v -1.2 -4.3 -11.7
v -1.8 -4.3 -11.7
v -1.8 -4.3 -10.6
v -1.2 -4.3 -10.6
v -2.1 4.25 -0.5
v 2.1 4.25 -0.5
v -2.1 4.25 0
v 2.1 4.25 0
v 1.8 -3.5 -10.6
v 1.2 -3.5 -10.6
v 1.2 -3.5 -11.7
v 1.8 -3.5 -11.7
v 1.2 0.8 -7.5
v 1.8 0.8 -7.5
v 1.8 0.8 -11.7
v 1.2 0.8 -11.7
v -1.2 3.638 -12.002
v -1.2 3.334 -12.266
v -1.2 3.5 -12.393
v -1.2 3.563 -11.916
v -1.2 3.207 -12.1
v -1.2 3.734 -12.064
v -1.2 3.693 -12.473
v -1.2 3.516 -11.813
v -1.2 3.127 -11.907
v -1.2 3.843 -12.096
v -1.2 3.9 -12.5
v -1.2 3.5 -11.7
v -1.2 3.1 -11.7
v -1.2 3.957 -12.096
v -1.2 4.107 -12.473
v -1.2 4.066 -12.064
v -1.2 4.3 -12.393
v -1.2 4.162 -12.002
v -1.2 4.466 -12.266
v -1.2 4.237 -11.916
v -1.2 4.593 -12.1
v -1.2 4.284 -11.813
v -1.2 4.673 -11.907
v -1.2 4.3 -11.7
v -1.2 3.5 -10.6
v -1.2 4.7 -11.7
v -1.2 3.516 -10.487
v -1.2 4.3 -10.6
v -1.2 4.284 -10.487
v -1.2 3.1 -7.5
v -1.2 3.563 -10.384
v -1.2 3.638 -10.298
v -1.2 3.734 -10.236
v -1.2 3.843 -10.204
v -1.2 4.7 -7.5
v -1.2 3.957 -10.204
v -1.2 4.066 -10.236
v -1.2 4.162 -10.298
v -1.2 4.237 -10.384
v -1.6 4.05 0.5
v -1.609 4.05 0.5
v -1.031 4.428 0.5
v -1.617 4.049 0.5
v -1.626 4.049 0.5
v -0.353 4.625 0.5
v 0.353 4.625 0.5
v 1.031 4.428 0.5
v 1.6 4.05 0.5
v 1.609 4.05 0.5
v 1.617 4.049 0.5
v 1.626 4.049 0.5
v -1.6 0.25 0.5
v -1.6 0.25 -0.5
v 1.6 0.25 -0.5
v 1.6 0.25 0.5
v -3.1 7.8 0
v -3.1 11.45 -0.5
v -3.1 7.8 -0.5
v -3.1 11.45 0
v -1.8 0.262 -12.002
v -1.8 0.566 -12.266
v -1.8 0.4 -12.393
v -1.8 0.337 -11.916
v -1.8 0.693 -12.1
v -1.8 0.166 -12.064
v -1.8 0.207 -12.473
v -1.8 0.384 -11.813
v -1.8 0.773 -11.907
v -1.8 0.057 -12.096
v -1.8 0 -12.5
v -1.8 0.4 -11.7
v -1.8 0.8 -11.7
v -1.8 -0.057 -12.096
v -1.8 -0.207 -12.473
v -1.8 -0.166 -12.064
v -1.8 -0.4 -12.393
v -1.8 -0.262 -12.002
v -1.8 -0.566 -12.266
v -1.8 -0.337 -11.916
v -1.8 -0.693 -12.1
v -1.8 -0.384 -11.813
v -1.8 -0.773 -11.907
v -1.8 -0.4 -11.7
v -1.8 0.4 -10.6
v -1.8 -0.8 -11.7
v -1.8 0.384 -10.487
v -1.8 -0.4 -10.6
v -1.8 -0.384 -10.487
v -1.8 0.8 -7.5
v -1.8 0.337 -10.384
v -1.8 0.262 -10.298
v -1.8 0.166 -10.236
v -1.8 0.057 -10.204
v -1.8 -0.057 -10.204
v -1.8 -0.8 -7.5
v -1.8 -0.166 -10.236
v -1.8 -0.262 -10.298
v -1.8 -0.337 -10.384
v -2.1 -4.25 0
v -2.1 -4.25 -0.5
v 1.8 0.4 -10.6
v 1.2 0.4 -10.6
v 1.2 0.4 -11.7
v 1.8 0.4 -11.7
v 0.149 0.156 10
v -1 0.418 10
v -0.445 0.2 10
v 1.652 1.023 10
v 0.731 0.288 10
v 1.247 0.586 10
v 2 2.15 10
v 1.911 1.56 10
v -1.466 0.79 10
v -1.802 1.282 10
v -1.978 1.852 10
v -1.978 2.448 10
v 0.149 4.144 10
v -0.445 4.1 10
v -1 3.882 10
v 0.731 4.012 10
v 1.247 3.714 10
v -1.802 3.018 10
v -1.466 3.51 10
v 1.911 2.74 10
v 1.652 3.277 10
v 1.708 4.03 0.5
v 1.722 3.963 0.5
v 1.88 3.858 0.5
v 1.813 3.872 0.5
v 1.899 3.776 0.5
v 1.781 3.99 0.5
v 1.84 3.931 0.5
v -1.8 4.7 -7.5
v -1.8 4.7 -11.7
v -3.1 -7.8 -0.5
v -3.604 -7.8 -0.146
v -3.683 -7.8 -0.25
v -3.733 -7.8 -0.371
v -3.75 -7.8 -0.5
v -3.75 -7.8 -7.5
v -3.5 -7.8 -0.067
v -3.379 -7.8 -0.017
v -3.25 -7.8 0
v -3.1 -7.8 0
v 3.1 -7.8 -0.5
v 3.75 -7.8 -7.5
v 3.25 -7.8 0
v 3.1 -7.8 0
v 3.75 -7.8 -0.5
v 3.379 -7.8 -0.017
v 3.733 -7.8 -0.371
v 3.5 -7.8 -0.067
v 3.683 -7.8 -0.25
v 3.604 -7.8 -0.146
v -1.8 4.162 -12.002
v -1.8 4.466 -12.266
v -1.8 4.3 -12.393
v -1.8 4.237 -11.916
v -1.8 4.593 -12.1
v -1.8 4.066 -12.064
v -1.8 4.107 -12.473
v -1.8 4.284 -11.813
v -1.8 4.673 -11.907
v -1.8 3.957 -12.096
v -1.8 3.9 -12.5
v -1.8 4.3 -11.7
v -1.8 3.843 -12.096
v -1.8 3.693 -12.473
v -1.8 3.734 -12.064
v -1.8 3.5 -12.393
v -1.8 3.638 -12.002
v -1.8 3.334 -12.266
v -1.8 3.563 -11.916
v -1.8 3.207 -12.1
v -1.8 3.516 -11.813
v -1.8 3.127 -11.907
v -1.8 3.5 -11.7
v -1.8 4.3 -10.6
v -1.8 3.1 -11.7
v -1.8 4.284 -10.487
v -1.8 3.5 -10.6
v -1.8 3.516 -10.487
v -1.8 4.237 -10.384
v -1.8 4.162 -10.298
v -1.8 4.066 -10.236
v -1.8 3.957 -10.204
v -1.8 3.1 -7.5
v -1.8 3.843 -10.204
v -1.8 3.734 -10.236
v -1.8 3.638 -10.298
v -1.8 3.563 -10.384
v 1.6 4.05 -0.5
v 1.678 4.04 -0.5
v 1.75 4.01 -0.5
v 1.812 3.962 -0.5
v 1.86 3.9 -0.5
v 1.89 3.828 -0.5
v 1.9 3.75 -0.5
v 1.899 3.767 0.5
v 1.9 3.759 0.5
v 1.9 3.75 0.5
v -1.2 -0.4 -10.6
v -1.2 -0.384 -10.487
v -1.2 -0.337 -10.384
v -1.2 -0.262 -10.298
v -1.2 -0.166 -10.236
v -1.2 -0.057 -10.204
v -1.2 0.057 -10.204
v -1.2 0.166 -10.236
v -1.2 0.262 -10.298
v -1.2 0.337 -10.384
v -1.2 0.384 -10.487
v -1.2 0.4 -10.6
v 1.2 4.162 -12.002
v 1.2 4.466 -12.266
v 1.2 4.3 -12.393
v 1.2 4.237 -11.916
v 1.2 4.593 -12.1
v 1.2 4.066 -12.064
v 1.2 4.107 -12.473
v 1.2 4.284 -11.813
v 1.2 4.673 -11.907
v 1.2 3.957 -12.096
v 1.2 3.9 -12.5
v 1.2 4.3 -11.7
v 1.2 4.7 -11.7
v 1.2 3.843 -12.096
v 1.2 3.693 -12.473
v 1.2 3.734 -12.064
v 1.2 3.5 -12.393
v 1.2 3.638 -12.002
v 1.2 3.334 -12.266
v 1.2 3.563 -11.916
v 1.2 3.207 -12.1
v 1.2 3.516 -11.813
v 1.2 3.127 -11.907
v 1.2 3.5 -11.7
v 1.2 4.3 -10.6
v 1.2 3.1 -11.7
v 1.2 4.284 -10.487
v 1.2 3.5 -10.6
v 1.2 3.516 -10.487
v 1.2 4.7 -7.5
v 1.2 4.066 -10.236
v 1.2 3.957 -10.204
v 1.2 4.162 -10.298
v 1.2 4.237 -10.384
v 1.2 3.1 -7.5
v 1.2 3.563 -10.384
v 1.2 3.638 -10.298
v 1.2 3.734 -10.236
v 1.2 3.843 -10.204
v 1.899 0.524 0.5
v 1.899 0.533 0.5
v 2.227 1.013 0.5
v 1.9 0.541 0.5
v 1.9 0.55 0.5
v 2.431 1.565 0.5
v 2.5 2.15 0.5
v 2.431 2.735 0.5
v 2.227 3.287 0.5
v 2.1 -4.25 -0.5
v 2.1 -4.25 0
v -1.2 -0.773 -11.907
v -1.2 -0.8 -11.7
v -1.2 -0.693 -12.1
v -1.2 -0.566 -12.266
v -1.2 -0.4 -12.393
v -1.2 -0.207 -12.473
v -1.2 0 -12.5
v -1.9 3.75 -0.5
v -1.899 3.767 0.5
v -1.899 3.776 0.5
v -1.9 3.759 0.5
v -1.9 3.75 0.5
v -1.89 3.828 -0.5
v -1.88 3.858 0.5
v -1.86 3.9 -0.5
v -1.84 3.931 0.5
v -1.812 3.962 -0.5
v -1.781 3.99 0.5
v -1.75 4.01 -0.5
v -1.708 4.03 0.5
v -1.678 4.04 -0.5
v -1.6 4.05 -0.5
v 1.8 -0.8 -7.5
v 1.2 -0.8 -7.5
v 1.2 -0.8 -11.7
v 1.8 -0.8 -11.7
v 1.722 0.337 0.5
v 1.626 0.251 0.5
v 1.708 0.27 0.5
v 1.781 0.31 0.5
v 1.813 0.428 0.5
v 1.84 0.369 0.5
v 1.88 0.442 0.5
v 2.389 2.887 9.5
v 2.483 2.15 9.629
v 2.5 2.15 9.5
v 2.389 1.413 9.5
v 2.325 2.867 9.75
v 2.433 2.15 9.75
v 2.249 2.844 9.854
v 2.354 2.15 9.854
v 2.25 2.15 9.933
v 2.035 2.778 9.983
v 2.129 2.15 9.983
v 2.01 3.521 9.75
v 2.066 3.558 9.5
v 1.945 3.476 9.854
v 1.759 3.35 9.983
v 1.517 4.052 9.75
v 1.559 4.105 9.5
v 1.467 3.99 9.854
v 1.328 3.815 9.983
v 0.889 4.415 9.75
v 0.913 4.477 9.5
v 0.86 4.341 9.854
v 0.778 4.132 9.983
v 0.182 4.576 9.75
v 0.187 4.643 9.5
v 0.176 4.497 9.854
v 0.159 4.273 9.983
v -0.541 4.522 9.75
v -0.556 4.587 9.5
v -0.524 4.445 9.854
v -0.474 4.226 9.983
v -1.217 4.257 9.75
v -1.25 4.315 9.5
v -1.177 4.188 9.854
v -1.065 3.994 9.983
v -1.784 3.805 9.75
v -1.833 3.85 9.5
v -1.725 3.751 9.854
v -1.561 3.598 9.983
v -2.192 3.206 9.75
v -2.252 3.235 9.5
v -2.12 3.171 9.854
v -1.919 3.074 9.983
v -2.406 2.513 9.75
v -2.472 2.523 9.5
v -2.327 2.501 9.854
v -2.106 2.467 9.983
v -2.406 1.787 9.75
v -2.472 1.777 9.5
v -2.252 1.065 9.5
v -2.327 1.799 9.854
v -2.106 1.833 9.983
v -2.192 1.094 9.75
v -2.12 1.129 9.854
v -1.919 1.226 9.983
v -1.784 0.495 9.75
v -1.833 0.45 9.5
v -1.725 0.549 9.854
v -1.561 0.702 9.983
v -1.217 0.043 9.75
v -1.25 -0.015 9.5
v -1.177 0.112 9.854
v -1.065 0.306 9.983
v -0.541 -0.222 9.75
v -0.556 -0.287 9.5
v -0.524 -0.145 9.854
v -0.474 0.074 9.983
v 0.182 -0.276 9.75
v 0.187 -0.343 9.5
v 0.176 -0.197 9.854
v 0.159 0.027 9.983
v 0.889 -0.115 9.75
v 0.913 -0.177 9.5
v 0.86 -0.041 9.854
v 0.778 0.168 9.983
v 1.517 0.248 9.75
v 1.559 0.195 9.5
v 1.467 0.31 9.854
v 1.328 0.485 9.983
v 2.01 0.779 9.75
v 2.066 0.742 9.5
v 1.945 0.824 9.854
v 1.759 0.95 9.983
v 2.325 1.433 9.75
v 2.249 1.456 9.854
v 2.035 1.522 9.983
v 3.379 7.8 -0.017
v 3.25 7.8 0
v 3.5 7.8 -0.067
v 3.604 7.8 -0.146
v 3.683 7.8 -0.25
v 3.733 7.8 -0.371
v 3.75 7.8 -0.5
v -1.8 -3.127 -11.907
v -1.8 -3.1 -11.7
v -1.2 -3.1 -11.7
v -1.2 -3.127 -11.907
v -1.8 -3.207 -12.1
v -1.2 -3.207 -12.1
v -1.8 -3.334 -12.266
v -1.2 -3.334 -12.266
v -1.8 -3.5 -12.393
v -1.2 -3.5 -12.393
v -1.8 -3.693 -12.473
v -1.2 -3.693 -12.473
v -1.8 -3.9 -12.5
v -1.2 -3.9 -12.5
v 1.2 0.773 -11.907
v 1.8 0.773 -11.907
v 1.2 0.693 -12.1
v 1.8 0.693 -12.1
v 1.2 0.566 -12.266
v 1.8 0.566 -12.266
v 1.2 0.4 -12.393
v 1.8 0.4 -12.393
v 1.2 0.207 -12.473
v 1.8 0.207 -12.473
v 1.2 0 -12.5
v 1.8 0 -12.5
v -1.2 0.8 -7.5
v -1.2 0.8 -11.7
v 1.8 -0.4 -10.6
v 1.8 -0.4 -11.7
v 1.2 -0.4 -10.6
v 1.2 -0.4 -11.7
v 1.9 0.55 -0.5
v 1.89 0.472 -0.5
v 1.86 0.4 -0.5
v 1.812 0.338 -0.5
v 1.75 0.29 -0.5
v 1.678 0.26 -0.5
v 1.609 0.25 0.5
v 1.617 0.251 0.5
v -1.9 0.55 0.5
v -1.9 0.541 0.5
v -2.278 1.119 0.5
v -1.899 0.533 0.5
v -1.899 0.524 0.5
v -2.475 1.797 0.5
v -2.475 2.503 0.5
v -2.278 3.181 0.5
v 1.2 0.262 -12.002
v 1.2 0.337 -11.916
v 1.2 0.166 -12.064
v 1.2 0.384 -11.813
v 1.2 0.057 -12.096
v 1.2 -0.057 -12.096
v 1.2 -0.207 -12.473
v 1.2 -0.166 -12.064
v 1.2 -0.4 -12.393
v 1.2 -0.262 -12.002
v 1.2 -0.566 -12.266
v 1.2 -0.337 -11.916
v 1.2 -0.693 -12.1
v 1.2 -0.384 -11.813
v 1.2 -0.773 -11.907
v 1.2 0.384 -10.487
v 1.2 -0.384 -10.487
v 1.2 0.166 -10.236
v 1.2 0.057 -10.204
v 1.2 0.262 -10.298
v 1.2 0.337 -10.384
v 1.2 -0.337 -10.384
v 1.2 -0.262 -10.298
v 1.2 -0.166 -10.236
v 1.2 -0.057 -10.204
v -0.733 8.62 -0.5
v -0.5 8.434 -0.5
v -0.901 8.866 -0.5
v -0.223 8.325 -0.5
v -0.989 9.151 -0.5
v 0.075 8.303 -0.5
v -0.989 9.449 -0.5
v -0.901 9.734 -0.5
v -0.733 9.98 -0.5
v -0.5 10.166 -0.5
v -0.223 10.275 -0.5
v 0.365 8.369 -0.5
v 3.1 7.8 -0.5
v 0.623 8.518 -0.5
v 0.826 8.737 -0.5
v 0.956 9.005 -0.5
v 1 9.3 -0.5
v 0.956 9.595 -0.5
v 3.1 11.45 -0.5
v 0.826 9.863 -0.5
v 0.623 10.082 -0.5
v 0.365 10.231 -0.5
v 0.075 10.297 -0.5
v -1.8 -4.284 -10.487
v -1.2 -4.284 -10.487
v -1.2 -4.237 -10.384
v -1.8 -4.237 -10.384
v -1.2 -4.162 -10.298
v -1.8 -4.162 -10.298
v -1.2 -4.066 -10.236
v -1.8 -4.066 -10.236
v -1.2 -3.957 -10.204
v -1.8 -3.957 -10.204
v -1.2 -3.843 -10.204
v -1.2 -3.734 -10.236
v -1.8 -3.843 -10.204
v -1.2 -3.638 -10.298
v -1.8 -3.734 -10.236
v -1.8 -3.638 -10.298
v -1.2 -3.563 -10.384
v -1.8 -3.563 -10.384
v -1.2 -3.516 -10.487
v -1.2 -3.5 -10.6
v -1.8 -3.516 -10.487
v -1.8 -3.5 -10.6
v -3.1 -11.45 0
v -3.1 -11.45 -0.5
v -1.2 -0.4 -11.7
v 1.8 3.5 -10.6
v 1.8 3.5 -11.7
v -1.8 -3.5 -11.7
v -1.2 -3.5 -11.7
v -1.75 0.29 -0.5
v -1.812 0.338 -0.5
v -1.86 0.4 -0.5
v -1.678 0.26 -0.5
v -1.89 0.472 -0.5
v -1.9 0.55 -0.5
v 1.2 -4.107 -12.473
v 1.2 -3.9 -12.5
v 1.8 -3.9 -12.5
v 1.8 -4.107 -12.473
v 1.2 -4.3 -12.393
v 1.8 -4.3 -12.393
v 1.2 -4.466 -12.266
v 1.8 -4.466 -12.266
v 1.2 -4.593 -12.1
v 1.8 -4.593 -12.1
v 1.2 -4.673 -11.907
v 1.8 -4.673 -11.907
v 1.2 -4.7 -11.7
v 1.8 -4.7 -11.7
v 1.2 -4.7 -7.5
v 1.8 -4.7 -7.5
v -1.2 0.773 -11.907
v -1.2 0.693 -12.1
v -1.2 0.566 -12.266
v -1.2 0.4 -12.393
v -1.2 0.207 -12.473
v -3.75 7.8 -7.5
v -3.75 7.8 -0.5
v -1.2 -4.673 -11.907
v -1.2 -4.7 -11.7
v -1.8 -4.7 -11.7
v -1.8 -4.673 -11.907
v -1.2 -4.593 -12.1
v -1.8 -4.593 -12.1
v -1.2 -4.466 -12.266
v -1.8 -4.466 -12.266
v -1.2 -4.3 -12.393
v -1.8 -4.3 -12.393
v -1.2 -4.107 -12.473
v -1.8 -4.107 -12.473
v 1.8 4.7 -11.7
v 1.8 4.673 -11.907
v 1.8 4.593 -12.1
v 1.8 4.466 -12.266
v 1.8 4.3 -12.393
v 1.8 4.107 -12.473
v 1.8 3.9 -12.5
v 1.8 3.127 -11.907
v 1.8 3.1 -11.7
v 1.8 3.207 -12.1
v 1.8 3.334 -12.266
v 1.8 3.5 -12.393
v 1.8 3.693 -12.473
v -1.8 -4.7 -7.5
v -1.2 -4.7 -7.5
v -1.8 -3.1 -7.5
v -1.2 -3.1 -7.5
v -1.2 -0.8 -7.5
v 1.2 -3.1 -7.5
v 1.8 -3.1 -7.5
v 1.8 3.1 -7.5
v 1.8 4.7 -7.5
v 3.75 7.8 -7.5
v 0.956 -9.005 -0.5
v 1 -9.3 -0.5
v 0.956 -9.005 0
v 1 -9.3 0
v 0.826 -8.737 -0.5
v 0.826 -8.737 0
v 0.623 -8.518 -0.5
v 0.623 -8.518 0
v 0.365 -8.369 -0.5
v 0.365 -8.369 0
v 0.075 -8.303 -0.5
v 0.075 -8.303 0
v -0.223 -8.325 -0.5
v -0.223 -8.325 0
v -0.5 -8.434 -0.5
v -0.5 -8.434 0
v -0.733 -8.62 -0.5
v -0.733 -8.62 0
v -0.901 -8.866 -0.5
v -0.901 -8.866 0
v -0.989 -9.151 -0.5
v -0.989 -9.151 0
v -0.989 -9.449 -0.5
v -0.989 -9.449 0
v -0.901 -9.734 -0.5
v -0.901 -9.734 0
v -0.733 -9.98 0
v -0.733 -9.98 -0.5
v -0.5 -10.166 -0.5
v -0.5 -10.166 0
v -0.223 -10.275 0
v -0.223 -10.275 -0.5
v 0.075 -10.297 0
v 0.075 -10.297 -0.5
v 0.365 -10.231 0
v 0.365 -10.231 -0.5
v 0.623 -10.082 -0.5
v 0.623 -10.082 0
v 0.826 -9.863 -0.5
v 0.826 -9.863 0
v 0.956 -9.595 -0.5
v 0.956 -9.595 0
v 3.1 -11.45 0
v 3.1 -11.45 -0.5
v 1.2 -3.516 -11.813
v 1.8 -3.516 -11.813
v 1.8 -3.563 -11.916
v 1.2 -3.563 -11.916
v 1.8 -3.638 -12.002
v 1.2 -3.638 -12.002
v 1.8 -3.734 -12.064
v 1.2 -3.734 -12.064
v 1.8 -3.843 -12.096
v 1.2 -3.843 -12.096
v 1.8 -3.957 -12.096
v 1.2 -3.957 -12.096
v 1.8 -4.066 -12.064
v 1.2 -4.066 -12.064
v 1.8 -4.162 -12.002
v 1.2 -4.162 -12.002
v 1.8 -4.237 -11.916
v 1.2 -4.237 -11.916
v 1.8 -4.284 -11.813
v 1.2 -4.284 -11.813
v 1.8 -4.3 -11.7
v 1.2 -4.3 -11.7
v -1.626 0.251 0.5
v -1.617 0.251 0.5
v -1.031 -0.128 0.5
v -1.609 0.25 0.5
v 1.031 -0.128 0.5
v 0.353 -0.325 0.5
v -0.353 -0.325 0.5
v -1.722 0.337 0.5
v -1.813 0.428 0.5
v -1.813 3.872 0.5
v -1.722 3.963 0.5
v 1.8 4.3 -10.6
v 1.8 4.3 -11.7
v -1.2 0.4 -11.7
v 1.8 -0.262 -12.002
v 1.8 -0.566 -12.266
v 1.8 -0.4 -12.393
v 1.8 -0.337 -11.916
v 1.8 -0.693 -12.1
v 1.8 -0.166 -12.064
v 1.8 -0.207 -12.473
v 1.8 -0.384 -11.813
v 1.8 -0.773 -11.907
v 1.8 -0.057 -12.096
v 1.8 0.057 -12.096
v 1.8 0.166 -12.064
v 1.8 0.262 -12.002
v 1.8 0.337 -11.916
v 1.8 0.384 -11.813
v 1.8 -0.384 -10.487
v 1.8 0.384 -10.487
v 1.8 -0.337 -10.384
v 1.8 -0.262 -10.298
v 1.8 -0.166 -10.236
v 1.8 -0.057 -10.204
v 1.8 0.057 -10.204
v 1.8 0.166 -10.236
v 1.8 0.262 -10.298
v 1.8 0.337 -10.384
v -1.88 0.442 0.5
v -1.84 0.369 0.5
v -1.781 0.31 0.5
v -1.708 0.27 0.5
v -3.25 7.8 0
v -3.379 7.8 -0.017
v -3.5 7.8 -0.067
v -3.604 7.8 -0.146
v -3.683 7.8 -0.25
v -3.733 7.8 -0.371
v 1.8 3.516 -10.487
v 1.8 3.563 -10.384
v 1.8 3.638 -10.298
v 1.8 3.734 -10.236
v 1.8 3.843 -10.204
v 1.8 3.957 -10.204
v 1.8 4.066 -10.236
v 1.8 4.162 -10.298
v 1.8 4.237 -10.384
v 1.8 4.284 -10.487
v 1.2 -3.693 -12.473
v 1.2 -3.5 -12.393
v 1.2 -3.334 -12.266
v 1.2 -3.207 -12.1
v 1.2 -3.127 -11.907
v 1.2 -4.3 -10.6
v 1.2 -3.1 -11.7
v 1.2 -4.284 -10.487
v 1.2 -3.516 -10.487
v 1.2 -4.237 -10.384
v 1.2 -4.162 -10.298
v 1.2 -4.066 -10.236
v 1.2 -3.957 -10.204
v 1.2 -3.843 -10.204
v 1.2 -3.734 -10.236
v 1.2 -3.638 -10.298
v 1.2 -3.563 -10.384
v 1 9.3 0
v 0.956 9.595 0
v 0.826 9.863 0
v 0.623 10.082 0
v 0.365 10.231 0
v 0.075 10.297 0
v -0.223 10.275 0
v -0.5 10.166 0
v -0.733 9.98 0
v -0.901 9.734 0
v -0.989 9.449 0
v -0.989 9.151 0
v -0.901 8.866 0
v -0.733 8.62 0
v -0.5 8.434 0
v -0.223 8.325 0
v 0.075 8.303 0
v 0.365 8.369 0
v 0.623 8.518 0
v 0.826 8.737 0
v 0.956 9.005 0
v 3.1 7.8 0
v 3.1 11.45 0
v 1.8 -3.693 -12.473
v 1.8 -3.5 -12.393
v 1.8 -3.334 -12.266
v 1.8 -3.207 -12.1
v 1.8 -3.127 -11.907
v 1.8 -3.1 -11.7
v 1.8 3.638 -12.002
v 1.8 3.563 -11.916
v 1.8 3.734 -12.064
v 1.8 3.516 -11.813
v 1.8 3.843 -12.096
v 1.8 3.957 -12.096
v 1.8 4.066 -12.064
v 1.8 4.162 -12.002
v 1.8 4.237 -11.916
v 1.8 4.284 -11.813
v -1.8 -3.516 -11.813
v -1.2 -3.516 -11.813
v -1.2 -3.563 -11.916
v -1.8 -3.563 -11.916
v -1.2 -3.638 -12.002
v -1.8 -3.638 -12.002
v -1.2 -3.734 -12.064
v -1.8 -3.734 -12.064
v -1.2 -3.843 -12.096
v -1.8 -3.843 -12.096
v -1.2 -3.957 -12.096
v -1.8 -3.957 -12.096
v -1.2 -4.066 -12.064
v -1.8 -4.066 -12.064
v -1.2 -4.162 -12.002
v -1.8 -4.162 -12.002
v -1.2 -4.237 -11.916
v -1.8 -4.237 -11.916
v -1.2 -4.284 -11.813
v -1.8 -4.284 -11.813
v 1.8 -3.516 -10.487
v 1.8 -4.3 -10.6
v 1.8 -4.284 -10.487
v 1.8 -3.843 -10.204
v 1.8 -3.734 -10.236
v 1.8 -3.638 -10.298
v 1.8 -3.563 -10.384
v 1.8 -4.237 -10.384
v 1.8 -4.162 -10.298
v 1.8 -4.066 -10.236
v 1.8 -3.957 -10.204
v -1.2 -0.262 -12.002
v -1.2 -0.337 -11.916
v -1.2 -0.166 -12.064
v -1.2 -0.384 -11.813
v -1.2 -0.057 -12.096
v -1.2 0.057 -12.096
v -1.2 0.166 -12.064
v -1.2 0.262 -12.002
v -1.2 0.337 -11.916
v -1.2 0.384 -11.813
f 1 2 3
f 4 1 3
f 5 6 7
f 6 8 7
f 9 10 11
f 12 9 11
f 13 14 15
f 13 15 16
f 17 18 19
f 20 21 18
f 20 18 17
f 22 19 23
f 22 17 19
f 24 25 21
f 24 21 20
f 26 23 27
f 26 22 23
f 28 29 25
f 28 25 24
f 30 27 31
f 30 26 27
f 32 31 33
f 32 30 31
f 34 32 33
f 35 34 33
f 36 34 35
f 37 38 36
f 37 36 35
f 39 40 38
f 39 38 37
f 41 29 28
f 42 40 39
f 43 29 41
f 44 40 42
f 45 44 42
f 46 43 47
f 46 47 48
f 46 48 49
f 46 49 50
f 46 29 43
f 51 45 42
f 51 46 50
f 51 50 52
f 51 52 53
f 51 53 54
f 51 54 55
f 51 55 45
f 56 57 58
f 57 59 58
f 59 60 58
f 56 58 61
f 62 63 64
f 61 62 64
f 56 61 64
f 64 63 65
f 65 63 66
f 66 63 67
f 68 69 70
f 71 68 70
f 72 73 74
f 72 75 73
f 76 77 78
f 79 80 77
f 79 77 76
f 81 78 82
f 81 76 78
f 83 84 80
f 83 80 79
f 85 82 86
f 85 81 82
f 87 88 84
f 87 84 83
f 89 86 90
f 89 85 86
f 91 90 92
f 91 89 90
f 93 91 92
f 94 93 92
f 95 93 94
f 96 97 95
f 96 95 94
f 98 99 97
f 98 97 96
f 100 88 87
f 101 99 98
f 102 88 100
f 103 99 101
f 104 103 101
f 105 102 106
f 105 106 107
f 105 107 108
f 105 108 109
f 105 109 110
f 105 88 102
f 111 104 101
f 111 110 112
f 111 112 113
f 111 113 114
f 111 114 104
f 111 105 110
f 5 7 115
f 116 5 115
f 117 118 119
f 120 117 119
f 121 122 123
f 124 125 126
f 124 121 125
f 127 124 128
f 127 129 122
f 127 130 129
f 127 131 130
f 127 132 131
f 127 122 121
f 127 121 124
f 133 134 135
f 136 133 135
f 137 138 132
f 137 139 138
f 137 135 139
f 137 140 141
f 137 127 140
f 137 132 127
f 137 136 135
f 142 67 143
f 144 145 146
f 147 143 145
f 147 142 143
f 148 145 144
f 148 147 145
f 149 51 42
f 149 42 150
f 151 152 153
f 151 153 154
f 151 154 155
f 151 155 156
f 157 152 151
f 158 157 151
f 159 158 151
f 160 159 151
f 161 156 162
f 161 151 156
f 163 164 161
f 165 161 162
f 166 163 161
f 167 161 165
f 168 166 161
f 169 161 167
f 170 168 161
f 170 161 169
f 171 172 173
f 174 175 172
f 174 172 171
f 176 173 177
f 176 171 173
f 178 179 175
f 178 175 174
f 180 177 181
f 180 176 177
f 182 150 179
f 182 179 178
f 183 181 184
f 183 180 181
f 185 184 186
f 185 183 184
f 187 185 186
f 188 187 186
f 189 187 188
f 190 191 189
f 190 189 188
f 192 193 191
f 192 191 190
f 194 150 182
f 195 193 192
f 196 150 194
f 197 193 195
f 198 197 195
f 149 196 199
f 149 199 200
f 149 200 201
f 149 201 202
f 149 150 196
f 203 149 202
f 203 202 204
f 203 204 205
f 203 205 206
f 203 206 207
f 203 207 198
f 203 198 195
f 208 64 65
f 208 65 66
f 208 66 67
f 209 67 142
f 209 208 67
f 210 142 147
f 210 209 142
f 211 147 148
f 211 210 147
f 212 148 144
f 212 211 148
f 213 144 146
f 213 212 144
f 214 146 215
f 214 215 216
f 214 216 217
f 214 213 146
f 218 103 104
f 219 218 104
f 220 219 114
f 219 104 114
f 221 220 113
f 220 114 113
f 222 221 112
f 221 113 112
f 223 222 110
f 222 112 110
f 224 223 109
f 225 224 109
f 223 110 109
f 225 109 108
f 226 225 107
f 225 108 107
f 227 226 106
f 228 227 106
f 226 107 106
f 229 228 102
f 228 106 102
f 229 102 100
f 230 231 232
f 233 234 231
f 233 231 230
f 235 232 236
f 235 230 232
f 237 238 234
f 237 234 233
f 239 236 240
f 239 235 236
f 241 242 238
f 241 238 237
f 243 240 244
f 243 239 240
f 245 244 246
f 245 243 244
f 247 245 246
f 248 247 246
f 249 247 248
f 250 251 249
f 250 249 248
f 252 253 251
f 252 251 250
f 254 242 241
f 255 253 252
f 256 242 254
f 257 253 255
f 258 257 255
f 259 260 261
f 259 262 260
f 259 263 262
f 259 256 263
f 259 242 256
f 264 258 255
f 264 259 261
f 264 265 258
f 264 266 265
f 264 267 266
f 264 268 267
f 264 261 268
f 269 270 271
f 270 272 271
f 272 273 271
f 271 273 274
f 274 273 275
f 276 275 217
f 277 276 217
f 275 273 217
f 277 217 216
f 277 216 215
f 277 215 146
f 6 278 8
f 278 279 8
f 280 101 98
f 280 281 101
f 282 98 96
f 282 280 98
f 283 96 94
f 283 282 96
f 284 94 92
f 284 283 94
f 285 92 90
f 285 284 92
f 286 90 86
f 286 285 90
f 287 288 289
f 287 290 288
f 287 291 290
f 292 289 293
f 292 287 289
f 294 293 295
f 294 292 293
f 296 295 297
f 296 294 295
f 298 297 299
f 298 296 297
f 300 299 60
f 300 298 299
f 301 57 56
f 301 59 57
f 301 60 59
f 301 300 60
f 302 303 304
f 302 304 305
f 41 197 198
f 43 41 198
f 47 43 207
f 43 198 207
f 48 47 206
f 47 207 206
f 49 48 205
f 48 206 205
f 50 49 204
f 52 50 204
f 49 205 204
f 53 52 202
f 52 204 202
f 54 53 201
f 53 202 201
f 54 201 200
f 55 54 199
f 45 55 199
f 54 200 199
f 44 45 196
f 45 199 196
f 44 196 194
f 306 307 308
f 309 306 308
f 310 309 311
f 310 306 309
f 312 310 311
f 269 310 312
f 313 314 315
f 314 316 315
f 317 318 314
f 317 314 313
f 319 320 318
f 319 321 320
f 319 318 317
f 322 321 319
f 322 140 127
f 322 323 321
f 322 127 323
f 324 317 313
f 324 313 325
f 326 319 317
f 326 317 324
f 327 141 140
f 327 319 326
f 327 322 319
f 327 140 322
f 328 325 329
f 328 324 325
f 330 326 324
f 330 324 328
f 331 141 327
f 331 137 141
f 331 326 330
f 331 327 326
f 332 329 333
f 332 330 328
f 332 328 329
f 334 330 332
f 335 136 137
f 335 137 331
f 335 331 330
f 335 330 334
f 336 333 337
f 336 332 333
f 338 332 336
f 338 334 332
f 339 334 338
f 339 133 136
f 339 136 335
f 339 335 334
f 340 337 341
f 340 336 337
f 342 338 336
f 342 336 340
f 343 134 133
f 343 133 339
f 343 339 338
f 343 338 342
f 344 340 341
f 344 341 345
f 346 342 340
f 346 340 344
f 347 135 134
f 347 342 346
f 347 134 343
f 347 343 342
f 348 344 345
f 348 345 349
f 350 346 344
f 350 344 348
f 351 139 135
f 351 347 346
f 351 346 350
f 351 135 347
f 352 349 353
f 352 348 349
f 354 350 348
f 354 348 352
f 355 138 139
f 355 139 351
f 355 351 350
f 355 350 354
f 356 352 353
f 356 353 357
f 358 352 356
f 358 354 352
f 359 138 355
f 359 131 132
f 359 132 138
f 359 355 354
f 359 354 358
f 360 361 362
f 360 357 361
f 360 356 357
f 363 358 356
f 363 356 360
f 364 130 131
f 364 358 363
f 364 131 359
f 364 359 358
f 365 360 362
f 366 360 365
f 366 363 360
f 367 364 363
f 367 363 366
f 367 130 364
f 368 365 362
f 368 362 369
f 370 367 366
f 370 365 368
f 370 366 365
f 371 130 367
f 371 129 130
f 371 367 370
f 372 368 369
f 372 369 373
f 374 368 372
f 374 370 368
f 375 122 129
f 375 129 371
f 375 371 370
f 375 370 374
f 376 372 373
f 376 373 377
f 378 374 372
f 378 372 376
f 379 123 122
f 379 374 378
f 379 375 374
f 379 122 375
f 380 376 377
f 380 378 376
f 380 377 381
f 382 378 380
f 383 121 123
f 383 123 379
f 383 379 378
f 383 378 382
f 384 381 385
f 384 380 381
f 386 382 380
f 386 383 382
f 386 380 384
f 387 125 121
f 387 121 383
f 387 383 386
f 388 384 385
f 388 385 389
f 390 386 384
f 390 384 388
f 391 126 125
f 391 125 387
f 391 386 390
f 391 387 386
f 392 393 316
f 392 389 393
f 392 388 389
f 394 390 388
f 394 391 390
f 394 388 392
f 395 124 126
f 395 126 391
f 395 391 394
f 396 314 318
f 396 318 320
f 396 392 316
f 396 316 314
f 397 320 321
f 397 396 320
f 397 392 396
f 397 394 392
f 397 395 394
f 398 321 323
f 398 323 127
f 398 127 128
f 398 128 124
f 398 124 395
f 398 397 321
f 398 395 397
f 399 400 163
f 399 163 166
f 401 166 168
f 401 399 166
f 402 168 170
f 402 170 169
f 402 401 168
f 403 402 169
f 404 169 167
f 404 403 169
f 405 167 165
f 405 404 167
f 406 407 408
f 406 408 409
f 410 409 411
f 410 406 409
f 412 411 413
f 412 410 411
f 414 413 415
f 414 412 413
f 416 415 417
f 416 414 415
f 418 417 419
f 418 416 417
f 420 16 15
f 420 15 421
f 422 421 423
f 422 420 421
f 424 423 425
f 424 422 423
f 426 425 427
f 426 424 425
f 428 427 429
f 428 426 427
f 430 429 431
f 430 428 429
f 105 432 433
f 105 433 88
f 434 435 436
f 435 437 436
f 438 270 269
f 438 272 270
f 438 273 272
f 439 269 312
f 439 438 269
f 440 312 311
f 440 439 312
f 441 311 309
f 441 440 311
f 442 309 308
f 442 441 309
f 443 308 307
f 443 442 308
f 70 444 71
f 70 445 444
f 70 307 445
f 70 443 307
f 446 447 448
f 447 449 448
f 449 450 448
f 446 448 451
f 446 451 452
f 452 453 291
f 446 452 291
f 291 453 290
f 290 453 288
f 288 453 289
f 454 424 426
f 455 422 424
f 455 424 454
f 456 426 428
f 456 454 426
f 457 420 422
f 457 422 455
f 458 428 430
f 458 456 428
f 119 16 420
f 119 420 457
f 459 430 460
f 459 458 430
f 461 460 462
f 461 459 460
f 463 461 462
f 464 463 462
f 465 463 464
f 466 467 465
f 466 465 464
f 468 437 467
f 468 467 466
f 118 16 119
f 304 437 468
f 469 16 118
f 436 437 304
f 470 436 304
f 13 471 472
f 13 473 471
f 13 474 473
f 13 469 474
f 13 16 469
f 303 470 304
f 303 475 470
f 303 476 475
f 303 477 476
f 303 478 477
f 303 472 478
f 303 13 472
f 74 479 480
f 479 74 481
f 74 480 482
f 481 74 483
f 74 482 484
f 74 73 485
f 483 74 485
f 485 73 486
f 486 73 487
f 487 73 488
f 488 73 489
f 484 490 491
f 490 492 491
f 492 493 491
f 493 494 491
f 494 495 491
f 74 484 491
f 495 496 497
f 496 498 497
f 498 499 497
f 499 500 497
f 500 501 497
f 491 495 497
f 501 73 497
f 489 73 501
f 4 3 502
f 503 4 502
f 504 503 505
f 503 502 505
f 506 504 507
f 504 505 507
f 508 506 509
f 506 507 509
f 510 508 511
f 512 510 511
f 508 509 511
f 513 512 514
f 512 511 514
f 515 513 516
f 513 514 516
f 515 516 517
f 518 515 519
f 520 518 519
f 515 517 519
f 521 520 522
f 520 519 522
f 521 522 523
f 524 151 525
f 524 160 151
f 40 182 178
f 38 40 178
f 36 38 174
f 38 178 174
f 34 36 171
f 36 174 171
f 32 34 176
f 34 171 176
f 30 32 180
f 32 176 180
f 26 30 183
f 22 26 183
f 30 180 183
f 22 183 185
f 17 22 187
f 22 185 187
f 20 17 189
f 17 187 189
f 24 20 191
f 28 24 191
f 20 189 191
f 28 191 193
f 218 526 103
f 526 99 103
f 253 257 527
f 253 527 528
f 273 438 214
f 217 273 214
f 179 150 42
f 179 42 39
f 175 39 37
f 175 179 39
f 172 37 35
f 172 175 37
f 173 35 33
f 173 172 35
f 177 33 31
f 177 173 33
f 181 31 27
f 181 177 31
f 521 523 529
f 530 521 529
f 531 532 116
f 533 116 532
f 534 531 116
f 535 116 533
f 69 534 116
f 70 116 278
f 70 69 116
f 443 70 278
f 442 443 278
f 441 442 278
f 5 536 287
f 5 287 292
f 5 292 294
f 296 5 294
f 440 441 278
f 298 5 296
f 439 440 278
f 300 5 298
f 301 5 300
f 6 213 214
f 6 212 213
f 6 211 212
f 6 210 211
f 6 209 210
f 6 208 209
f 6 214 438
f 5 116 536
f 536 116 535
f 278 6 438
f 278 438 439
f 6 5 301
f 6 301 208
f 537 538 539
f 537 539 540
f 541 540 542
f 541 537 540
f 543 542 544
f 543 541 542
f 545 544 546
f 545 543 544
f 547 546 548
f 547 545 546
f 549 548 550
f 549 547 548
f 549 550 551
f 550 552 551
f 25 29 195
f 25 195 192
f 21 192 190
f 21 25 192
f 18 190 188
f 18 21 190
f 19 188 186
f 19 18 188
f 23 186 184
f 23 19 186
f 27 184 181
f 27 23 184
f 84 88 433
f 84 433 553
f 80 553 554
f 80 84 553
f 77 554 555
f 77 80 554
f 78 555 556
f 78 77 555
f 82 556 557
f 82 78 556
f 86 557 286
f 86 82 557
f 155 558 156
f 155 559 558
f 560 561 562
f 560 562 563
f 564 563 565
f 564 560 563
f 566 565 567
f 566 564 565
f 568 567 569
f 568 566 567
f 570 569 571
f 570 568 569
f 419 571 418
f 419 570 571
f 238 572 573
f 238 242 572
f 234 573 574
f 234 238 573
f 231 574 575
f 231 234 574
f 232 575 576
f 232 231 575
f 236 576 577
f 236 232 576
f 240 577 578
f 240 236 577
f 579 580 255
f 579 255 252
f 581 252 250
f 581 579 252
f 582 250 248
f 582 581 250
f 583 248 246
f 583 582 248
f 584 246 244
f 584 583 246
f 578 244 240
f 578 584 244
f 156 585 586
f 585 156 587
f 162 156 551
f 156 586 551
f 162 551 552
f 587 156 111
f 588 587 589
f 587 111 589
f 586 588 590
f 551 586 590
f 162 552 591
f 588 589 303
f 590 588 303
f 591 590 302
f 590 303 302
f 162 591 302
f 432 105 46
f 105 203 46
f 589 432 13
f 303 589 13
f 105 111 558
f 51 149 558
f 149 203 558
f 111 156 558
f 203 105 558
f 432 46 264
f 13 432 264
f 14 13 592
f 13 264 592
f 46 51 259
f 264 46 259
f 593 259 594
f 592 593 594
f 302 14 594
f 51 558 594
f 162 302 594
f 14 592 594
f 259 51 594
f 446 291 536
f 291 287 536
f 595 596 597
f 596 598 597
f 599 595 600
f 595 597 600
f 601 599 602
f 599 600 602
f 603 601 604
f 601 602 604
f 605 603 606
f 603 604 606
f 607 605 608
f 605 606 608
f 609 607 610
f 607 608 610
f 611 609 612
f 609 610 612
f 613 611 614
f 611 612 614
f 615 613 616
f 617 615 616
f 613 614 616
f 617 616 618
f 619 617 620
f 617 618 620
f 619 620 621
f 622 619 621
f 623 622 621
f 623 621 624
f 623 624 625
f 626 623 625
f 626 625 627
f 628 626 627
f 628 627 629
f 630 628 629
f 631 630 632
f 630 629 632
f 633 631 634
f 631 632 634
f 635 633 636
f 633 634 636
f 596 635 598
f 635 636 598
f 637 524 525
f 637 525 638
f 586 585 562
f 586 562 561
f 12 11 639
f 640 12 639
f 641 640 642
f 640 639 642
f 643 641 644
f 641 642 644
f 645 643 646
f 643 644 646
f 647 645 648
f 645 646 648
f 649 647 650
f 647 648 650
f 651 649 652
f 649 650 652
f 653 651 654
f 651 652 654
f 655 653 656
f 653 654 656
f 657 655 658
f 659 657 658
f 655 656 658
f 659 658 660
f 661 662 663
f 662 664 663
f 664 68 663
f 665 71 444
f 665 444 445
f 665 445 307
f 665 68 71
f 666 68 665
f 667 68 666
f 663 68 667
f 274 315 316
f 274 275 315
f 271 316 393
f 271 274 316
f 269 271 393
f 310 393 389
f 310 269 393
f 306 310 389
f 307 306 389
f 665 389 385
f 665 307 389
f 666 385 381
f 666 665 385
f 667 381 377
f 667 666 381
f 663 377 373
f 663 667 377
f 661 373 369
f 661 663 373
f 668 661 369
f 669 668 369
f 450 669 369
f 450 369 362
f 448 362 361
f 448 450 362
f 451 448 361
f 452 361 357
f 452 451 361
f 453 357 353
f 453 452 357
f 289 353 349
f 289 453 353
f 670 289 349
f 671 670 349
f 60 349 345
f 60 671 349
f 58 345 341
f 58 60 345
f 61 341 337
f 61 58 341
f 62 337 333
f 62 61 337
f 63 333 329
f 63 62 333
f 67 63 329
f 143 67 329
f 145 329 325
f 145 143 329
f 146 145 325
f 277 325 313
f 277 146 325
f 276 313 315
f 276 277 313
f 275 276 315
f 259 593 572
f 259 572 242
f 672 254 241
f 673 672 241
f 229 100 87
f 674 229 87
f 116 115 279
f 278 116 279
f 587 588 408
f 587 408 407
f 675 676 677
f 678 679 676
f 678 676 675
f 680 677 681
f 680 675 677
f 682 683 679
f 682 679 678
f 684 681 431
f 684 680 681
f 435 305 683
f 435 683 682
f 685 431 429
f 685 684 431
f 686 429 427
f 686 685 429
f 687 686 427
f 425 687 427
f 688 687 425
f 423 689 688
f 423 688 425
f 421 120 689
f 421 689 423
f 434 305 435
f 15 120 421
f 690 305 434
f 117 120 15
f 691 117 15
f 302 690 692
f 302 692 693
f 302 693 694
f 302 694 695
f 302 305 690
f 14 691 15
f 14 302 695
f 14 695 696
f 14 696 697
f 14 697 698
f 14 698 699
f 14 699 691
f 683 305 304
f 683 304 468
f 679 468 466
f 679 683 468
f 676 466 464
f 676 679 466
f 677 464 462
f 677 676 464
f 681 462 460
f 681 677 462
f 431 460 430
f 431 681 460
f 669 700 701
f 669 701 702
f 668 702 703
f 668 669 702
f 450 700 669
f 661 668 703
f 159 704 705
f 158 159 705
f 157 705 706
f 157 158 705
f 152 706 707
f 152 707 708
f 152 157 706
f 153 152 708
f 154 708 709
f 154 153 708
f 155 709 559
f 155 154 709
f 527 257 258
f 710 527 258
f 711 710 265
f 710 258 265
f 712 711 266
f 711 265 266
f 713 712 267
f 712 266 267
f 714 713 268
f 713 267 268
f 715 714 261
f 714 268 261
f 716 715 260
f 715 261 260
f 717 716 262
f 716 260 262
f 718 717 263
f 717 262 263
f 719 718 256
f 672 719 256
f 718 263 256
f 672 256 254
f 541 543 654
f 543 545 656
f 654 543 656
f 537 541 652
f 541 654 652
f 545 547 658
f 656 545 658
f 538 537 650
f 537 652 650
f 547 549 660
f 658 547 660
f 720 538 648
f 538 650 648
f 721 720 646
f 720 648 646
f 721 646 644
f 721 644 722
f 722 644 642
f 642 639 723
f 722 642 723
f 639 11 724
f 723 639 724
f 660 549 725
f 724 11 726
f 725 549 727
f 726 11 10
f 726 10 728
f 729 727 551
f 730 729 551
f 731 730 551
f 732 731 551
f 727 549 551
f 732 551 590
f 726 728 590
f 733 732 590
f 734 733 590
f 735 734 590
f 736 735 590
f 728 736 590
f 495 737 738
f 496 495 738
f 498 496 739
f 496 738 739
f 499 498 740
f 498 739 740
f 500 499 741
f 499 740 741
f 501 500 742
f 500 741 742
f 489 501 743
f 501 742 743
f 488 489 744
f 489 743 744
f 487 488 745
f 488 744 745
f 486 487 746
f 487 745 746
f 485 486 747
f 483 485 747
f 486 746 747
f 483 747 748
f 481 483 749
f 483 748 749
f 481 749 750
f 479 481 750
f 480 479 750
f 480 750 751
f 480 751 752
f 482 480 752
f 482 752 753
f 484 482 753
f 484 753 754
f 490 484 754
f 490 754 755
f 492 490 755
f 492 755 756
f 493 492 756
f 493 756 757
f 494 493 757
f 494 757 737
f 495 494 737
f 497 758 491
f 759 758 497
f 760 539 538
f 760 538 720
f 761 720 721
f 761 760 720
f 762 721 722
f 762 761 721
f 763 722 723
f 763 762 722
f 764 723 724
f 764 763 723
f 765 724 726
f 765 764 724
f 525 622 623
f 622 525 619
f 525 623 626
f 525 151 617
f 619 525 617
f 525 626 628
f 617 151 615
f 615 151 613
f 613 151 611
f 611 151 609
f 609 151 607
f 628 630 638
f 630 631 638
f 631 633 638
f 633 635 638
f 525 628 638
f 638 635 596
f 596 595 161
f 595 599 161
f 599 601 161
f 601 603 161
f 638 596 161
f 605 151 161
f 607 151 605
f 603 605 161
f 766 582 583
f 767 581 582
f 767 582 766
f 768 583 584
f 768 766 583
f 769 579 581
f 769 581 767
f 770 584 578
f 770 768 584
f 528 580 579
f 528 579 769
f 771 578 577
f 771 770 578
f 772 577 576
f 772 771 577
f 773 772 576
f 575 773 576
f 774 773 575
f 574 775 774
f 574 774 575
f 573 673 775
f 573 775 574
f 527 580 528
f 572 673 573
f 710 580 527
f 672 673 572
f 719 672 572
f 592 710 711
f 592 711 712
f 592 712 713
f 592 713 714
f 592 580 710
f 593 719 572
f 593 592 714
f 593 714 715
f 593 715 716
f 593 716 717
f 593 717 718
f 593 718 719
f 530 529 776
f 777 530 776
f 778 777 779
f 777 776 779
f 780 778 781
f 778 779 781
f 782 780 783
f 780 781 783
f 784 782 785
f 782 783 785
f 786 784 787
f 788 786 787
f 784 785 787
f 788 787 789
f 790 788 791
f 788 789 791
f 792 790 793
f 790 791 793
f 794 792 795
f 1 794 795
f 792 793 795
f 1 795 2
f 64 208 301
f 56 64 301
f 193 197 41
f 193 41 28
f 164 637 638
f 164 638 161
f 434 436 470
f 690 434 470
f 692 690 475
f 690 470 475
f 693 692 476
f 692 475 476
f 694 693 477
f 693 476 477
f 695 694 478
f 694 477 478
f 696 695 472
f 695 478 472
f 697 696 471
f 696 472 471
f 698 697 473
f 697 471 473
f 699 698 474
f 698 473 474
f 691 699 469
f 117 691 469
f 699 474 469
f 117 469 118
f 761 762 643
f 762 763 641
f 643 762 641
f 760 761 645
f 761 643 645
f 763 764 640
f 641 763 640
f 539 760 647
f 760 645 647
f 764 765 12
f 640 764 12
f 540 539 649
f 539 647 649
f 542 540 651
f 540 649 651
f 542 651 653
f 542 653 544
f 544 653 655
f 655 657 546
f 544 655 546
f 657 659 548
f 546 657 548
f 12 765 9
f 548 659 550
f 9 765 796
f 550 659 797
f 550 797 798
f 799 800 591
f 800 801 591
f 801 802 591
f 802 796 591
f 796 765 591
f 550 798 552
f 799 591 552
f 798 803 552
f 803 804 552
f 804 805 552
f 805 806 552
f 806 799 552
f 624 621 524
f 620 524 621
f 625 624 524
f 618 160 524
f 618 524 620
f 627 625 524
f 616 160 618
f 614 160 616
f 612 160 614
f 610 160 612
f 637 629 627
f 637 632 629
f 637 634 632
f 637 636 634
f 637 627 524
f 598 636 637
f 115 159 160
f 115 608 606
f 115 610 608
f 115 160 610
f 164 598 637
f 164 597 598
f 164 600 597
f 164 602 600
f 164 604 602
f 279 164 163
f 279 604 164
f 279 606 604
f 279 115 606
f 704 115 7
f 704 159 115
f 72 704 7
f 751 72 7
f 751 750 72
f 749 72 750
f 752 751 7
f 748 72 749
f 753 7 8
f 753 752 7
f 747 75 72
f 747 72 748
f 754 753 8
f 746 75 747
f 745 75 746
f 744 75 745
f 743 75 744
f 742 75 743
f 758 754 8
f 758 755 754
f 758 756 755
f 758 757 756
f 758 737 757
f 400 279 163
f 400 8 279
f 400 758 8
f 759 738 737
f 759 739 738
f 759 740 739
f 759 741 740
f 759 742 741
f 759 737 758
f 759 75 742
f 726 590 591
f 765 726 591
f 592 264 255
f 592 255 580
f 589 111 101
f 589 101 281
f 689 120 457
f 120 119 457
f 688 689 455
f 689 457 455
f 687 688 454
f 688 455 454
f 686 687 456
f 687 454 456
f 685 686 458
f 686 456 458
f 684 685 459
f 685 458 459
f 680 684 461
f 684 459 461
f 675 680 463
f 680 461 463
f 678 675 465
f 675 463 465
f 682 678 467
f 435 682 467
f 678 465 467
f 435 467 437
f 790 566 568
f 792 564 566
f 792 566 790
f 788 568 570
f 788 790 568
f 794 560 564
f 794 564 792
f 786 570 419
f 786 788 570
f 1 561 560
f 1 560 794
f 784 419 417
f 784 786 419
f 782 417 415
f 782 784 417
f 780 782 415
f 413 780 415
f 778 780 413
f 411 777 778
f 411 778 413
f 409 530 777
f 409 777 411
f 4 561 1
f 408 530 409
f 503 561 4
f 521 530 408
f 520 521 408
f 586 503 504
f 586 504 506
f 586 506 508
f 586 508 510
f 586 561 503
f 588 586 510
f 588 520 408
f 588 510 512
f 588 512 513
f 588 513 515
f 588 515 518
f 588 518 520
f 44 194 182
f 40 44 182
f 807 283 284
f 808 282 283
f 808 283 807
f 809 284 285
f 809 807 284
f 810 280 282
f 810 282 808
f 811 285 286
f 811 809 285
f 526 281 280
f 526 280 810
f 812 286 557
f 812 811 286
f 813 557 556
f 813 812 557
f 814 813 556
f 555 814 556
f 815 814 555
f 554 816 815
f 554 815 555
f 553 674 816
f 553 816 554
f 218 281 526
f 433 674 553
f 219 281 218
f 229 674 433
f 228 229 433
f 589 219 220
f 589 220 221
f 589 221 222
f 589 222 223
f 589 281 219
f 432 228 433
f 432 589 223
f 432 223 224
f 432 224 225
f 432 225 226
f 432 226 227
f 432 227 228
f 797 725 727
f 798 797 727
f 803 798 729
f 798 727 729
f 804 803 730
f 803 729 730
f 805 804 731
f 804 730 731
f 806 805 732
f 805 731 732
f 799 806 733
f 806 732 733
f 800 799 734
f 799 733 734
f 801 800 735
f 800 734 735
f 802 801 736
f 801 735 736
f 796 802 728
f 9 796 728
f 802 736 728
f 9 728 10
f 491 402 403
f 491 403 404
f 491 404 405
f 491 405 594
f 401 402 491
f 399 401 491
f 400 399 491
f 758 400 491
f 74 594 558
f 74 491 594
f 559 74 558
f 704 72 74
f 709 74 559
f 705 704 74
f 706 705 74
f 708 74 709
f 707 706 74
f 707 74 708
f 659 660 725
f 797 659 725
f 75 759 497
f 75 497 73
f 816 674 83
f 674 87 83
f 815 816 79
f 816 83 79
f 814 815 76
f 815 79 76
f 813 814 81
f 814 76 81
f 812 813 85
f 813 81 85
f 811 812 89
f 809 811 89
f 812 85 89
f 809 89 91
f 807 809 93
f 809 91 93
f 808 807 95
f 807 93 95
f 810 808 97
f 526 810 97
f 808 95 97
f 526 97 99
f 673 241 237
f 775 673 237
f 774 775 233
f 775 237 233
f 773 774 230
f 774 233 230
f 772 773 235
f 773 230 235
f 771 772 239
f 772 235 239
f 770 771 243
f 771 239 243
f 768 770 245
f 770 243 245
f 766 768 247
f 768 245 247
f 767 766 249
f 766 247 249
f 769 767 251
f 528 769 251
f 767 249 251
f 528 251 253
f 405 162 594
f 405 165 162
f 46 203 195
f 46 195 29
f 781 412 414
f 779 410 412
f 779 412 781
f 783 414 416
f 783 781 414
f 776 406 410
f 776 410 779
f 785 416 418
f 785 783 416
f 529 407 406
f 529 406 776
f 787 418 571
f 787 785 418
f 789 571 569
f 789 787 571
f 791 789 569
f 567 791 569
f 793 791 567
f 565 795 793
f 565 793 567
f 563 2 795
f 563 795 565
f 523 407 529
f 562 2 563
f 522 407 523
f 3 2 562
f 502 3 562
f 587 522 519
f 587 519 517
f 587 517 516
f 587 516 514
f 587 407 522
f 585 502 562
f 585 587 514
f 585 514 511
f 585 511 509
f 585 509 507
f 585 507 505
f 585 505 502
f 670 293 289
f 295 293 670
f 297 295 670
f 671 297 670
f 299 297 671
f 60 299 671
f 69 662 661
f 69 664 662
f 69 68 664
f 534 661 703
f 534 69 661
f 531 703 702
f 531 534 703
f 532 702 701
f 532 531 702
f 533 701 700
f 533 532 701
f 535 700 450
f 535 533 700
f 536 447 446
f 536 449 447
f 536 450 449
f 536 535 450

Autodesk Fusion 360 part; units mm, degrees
sketch "Skizze1" plane through (0, 0, 0) normal (0, 0, 1) x (1, 0, 0)
  line L0 (3.1, 11.45) -> (-3.1, 11.45)
  line L1 (-3.1, 11.45) -> (-3.1, -11.45)
  line L2 (-3.1, -11.45) -> (3.1, -11.45)
  line L3 (3.1, -11.45) -> (3.1, 11.45)
  line L4 (3.1, 11.45) -> (-3.1, -11.45) construction
  line L5 (-3.1, 11.45) -> (3.1, -11.45) construction
  line L6 (3.75, 7.8) -> (-3.75, 7.8)
  line L7 (-3.75, 7.8) -> (-3.75, -7.8)
  line L8 (-3.75, -7.8) -> (3.75, -7.8)
  line L9 (3.75, -7.8) -> (3.75, 7.8)
  line L10 (3.75, 7.8) -> (-3.75, -7.8) construction
  line L11 (-3.75, 7.8) -> (3.75, -7.8) construction
  line L12 (0, 0) -> (6.5711, 0) construction
  line L13 (0, 0) -> (0, 13.796) construction
  line L14 (2.1, 4.25) -> (-2.1, 4.25)
  line L15 (-2.1, 4.25) -> (-2.1, -4.25)
  line L16 (-2.1, -4.25) -> (2.1, -4.25)
  line L17 (2.1, -4.25) -> (2.1, 4.25)
  line L18 (2.1, 4.25) -> (-2.1, -4.25) construction
  line L19 (-2.1, 4.25) -> (2.1, -4.25) construction
  line L20 (-1.6, 0.25) -> (1.6, 0.25)
  line L21 (1.9, 0.55) -> (1.9, 3.75)
  line L22 (1.6, 4.05) -> (-1.6, 4.05)
  line L23 (-1.9, 3.75) -> (-1.9, 0.55)
  arc A0 (-1.6, 4.05) -> (-1.9, 3.75) centre (-1.6, 3.75) ccw
  arc A1 (1.9, 3.75) -> (1.6, 4.05) centre (1.6, 3.75) ccw
  arc A2 (1.6, 0.25) -> (1.9, 0.55) centre (1.6, 0.55) ccw
  arc A3 (-1.9, 0.55) -> (-1.6, 0.25) centre (-1.6, 0.55) ccw
  line L24 (-1.9, 2.15) -> (1.9, 2.15) construction
  circle A4 centre (0, 2.15) radius 2.5
  circle A5 centre (0, 9.3) radius 1
  line L25 (0, 0) -> (0, -9.9922) construction
  circle A6 centre (0, -9.3) radius 1
  point P0 (1.9, 4.05)
  point P1 (-1.9, 4.05)
  dimension "d133" = 6.2
  dimension "d134" = 22.9
  dimension "d135" = 7.5
  dimension "d136" = 15.6
  dimension "d137" = 4.2
  dimension "d138" = 8.5
  dimension "d139" = 3.8
  dimension "d140" = 3.8
  dimension "d141" = 0.2
  dimension "d142" = 0.2
  dimension "d143" = 0.3
  dimension "d144" = 0.3
  dimension "d145" = 0.3
  dimension "d146" = 0.3
  dimension "d147" = 5
  dimension "d148" = 2
  dimension "d149" = 9.3
extrude "Extrusion1" add sketch "Skizze1" against normal blind 0.5 contours L0 L1 L3 L6 | L1 L3 L6 L8 | L1 L2 L3 L8 | L14 A4 | L17 A4 | L15 A4
extrude "Extrusion2" add sketch "Skizze1" against normal blind 0.5 contours L3 L6 L8 L9 | L1 L6 L7 L8
extrude "Extrusion3" add sketch "Skizze1" against normal blind 7 from surface at -0.5 contours L3 L6 L8 L9 | L1 L3 L6 L8 | L1 L6 L7 L8 | L14 L17 A1 A4 | L14 L22 A0 A1 A4 | L14 A4 | L17 A4 | L17 L21 A1 A2 A4 | L14 L15 A0 A4 | L20 L21 L22 L23 A0 A1 A2 A3 A4 | A1 A4 | L15 L16 L17 A2 A3 A4 | A0 A4 | A2 A4 | L15 L23 A0 A3 A4 | L15 A4 | L20 A2 A3 A4 | A3 A4
fillet "Abrundung1" radius 0.5 2 edges at (3.75, 0, 0) (-3.75, 0, 0)
extrude "Extrusion4" add sketch "Skizze1" along normal blind 0.5 and the other way blind 0.5 contours L20 L21 L22 L23 A0 A1 A2 A3 A4 | A1 A4 | A0 A4 | A2 A4 | A3 A4
extrude "Extrusion5" add sketch "Skizze1" along normal blind 9.5 from surface at 0.5 contours L14 L22 A0 A1 A4 | L14 A4 | L17 A4 | L17 L21 A1 A2 A4 | L20 L21 L22 L23 A0 A1 A2 A3 A4 | L15 L23 A0 A3 A4 | L15 A4 | L20 A2 A3 A4
fillet "Abrundung2" radius 0.5 1 edges at (-2.3308, 1.246, 10)
sketch "Skizze2" plane through (0, 0, -7.5) normal (0, 0, -1) x (1, 0, 0)
  line L0 (3.75, -7.8) -> (3.75, 7.8)
  line L1 (3.75, 7.8) -> (-3.75, 7.8)
  line L2 (-3.75, 7.8) -> (-3.75, -7.8)
  line L3 (-3.75, -7.8) -> (3.75, -7.8)
  line L4 (3.75, 7.8) -> (3.75, -7.8)
  line L5 (-3.75, 7.8) -> (3.75, 7.8)
  line L6 (-3.75, -7.8) -> (-3.75, 7.8)
  line L7 (3.75, -7.8) -> (-3.75, -7.8)
  line L8 (0, 0) -> (0, 9.0857) construction
  line L9 (0, 0) -> (7.5179, 0) construction
  line L10 (1.2, 0.8) -> (1.8, 0.8)
  line L11 (1.8, 0.8) -> (1.8, -0.8)
  line L12 (1.8, -0.8) -> (1.2, -0.8)
  line L13 (1.2, -0.8) -> (1.2, 0.8)
  line L14 (-1.8, 0.8) -> (-1.2, 0.8)
  line L15 (-1.2, 0.8) -> (-1.2, -0.8)
  line L16 (-1.2, -0.8) -> (-1.8, -0.8)
  line L17 (-1.8, -0.8) -> (-1.8, 0.8)
  line L18 (1.2, 3.1) -> (1.8, 3.1)
  line L19 (1.8, 3.1) -> (1.8, 4.7)
  line L20 (1.8, 4.7) -> (1.2, 4.7)
  line L21 (1.2, 4.7) -> (1.2, 3.1)
  line L22 (-1.8, 4.7) -> (-1.2, 4.7)
  line L23 (-1.2, 4.7) -> (-1.2, 3.1)
  line L24 (-1.2, 3.1) -> (-1.8, 3.1)
  line L25 (-1.8, 3.1) -> (-1.8, 4.7)
  line L26 (1.2, -3.1) -> (1.8, -3.1)
  line L27 (1.8, -3.1) -> (1.8, -4.7)
  line L28 (1.8, -4.7) -> (1.2, -4.7)
  line L29 (1.2, -4.7) -> (1.2, -3.1)
  line L30 (-1.8, -3.1) -> (-1.2, -3.1)
  line L31 (-1.2, -3.1) -> (-1.2, -4.7)
  line L32 (-1.2, -4.7) -> (-1.8, -4.7)
  line L33 (-1.8, -4.7) -> (-1.8, -3.1)
  dimension "d166" = 0.6
  dimension "d167" = 1.6
  dimension "d168" = 1.2
  dimension "d169" = 1.6
  dimension "d170" = 5.5
extrude "Extrusion6" add sketch "Skizze2" along normal blind 5 contours L10 L11 L12 L13 | L14 L15 L16 L17 | L18 L19 L20 L21 | L22 L23 L24 L25 | L26 L27 L28 L29 | L30 L31 L32 L33
fillet "Abrundung3" radius 0.8 12 edges at (-1.5, -3.1, -12.5) (-1.5, -4.7, -12.5) (1.5, -4.7, -12.5) (1.5, -3.1, -12.5) (-1.5, -0.8, -12.5) (-1.5, 0.8, -12.5) (1.5, 0.8, -12.5) (1.5, -0.8, -12.5) (-1.5, 4.7, -12.5) (-1.5, 3.1, -12.5) (1.5, 3.1, -12.5) (1.5, 4.7, -12.5)
sketch "Skizze3" plane through (-1.8, 0, 0) normal (-1, 0, 0) x (0, -1, 0)
  arc A0 (-0.8, -11.7) -> (0.8, -11.7) centre (0, -11.7) ccw
  line L0 (0.8, -11.7) -> (0.8, -7.5)
  line L1 (0.8, -7.5) -> (-0.8, -7.5)
  line L2 (-0.8, -7.5) -> (-0.8, -11.7)
  line L3 (-4.7, -7.5) -> (-4.7, -11.7)
  arc A1 (-4.7, -11.7) -> (-3.1, -11.7) centre (-3.9, -11.7) ccw
  line L4 (-3.1, -7.5) -> (-3.1, -11.7)
  line L5 (-0.8, -7.5) -> (-0.8, -11.7)
  arc A2 (-0.8, -11.7) -> (0.8, -11.7) centre (0, -11.7) ccw
  line L6 (0.8, -7.5) -> (0.8, -11.7)
  line L7 (3.1, -7.5) -> (3.1, -11.7)
  line L8 (4.7, -7.5) -> (4.7, -11.7)
  arc A3 (3.1, -11.7) -> (4.7, -11.7) centre (3.9, -11.7) ccw
  line L9 (4.7, -11.7) -> (4.7, -7.5)
  line L10 (4.7, -7.5) -> (3.1, -7.5)
  line L11 (3.1, -7.5) -> (3.1, -11.7)
  line L12 (7.8, -7.5) -> (-7.8, -7.5)
  line L13 (-4.3, -10.6) -> (-4.3, -11.7)
  arc A4 (-4.3, -11.7) -> (-3.5, -11.7) centre (-3.9, -11.7) ccw
  line L14 (-3.5, -10.6) -> (-3.5, -11.7)
  line L15 (-0.4, -10.6) -> (-0.4, -11.7)
  arc A5 (-0.4, -11.7) -> (0.4, -11.7) centre (0, -11.7) ccw
  line L16 (0.4, -11.7) -> (0.4, -10.6)
  line L17 (3.5, -10.6) -> (3.5, -11.7)
  arc A6 (3.5, -11.7) -> (4.3, -11.7) centre (3.9, -11.7) ccw
  line L18 (4.3, -11.7) -> (4.3, -10.6)
  line L19 (-3.9, -10.2) -> (-3.9, -10.2)
  line L20 (0, -10.2) -> (0, -10.2)
  line L21 (3.9, -10.2) -> (3.9, -10.2)
  arc A7 (0, -10.2) -> (-0.4, -10.6) centre (0, -10.6) ccw
  arc A8 (0.4, -10.6) -> (0, -10.2) centre (0, -10.6) ccw
  arc A9 (-3.5, -10.6) -> (-3.9, -10.2) centre (-3.9, -10.6) ccw
  arc A10 (-3.9, -10.2) -> (-4.3, -10.6) centre (-3.9, -10.6) ccw
  arc A11 (3.9, -10.2) -> (3.5, -10.6) centre (3.9, -10.6) ccw
  arc A12 (4.3, -10.6) -> (3.9, -10.2) centre (3.9, -10.6) ccw
  dimension "d178" = 0.4
  dimension "d179" = 0.4
  dimension "d180" = 0.4
  dimension "d181" = 0.4
  dimension "d182" = 0.4
  dimension "d183" = 0.4
  dimension "d184" = 0.4
  dimension "d185" = 1.1
  dimension "d186" = 0.4
  dimension "d187" = 0.4
  dimension "d188" = 1.1
  dimension "d189" = 1.1
extrude "Extrusion7" cut sketch "Skizze3" against normal blind 4 contours L13 A4 L14 A9 A10 | L15 A5 L16 A7 A8 | L17 A6 L18 A11 A12
ref_plane "Arbeitsebene1" through (0, 0, -3.75) normal (1, 0, 0) x (0, -1, 0)
equation "d169 = d167"
